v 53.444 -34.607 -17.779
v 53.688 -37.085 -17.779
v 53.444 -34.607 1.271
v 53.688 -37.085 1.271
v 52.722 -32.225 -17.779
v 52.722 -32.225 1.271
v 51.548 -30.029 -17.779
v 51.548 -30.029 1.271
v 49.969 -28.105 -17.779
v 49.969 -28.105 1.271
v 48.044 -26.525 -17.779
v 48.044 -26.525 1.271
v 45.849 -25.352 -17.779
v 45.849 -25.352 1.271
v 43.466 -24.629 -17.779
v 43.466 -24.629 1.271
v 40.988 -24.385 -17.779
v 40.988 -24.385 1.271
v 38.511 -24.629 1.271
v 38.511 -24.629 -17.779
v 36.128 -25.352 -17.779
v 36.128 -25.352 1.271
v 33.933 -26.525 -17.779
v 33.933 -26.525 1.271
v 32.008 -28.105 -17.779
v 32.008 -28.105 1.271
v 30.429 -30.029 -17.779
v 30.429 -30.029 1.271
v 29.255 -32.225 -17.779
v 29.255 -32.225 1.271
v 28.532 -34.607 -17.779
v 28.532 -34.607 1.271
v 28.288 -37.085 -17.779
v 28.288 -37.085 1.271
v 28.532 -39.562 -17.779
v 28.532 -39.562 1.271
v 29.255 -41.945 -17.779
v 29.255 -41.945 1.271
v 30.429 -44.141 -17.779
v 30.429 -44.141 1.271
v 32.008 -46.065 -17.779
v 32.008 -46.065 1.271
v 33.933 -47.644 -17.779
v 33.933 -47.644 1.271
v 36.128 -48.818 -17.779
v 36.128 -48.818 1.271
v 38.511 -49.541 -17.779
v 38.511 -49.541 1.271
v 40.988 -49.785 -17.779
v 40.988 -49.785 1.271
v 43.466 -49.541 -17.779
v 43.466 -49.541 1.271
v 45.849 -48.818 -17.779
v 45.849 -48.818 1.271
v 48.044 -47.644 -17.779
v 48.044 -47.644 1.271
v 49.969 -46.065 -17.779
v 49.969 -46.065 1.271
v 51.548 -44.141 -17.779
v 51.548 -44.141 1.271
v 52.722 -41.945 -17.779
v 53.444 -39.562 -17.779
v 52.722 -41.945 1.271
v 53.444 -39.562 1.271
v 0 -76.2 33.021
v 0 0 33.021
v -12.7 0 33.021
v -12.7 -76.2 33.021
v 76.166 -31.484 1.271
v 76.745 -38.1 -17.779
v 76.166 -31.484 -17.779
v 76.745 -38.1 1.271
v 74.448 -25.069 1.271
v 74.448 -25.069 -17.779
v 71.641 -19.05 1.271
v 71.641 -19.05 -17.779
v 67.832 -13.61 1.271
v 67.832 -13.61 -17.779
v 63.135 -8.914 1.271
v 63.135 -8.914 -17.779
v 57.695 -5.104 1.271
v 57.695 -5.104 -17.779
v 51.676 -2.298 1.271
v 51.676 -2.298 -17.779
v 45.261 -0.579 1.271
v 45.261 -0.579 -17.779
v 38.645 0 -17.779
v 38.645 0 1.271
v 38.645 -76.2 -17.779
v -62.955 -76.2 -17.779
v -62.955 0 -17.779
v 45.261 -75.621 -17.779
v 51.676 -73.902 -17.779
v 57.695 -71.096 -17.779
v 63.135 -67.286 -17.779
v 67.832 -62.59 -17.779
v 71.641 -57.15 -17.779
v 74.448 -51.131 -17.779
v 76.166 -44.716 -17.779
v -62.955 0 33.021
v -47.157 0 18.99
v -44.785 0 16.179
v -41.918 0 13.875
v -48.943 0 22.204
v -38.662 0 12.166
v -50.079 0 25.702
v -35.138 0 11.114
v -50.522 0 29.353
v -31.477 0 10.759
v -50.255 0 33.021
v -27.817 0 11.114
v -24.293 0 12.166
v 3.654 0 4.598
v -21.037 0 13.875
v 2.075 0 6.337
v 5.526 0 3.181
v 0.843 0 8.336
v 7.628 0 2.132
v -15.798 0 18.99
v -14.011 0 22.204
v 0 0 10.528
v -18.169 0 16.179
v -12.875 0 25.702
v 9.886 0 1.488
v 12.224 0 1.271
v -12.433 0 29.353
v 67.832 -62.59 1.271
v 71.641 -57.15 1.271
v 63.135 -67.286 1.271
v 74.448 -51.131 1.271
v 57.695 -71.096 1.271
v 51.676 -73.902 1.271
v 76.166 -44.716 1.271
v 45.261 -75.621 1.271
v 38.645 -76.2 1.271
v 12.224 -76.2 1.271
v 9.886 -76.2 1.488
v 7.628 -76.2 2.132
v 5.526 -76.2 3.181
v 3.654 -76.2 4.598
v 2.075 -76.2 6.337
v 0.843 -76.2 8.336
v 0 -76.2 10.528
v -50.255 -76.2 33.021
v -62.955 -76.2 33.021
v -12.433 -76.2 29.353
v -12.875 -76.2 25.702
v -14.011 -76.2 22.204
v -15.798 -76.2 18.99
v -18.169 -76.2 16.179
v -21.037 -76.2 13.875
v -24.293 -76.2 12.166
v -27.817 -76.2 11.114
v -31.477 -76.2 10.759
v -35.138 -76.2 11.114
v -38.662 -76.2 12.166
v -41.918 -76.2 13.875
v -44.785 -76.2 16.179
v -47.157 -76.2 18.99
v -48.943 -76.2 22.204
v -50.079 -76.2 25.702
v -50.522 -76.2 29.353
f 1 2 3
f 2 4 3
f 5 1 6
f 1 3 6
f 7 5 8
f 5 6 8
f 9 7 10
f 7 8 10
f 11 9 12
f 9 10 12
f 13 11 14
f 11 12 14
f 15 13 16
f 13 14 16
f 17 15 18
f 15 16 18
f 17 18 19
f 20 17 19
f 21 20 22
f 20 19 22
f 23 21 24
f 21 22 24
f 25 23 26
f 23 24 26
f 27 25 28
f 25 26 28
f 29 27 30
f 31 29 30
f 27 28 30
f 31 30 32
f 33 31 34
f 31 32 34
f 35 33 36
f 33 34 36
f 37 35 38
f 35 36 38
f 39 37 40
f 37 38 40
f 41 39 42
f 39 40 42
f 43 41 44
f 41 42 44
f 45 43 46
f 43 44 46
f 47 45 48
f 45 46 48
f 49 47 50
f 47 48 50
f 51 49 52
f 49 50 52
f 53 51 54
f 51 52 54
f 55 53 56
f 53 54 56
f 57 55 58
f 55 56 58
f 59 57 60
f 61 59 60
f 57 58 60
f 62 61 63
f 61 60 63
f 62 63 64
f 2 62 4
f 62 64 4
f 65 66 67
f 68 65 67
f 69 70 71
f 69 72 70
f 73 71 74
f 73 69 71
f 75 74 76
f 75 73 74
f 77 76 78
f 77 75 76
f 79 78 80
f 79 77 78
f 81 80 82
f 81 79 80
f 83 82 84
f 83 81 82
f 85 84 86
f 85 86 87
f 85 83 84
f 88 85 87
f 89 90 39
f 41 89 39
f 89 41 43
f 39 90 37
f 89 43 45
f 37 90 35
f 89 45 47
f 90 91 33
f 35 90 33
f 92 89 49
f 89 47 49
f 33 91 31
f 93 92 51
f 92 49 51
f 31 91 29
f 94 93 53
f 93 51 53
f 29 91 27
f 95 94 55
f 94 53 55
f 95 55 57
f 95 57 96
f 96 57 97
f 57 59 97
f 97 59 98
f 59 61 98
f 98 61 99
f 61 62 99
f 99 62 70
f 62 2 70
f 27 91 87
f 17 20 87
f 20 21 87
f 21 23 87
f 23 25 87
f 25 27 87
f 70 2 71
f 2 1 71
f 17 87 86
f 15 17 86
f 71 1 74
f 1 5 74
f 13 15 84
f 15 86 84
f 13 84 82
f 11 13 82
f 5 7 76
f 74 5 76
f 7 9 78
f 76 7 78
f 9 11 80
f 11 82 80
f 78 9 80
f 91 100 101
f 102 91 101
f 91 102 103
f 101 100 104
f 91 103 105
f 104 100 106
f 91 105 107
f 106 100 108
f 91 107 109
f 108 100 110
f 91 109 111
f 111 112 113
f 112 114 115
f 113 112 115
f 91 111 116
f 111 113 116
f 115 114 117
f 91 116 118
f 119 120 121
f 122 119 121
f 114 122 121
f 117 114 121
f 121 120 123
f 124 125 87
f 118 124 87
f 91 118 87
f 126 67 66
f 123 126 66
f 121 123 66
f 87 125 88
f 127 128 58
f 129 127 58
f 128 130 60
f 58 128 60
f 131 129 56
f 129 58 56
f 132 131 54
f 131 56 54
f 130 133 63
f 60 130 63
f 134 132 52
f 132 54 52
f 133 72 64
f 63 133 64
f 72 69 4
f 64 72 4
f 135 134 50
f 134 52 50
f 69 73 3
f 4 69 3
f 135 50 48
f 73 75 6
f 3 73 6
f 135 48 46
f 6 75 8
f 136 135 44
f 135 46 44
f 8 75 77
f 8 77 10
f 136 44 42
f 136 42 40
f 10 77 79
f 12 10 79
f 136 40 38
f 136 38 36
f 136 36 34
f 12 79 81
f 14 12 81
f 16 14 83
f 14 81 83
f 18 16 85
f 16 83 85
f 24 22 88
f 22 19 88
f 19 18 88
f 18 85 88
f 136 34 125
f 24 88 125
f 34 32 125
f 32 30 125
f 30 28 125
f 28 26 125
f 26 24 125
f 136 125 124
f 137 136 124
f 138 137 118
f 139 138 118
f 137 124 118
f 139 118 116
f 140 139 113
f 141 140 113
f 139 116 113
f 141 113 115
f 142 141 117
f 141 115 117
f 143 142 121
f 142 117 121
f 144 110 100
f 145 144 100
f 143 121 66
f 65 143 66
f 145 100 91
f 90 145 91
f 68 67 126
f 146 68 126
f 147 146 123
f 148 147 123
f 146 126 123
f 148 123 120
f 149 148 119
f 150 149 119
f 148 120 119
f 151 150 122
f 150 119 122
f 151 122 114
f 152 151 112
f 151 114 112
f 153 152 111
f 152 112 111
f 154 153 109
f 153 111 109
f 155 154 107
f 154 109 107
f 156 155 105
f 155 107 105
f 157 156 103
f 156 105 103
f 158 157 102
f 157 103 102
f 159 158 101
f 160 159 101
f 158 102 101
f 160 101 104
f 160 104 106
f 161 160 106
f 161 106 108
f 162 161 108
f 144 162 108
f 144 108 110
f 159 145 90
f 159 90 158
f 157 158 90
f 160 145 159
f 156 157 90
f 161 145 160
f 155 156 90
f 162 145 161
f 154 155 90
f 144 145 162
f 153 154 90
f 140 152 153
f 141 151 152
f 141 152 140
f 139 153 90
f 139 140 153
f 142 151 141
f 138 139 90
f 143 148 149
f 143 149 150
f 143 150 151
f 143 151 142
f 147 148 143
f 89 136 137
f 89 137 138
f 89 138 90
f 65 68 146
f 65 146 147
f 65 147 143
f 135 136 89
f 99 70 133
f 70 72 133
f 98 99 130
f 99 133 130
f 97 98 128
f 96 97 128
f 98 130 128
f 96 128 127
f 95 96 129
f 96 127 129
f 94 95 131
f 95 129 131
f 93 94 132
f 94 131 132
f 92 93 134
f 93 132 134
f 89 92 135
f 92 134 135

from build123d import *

# Parameters (mm, degrees)
F1_DEPTH = 76.2
F2_R     = 38.09999
F3_R     = 12.7
F4_DEPTH = 50.8
F5_DEPTH = 25.4


# Not quite as in the source:
# - a fillet or chamfer is up to 0.001 mm smaller than in the source, because OpenCascade refuses the exact size


with BuildPart() as f1:
    # F0 (on Front) → F1 (new body)
    with BuildSketch(Plane.XZ):
        with BuildLine():
            Line((-50.2547219646, 33.020831282), (-62.9547219646, 33.020831282))
            Line((-62.9547219646, 33.020831282), (-62.9547219646, -17.779168718))
            Line((-62.9547219646, -17.779168718), (76.7452780354, -17.779168718))
            Line((76.7452780354, -17.779168718), (76.7452780354, 1.270831282))
            Line((76.7452780354, 1.270831282), (12.2243361415, 1.270831282))
            ThreePointArc((12.2243361415, 1.270831282), (4.5574789786, 3.8461435711), (0, 10.5276342357))
            Line((0, 10.5276342357), (0, 33.020831282))
            Line((0, 33.020831282), (-12.7, 33.020831282))
            ThreePointArc((-12.7, 33.020831282), (-31.4773609823, 10.7594118855), (-50.2547219646, 33.020831282))
        make_face()
    extrude(amount=F1_DEPTH)

    # F2 (radius 38.1 in the source; OpenCascade refuses exactly that, so slightly less here)
    f2_edges = [f1.edges().sort_by_distance(p)[0] for p in [
        (76.745278, -76.2, -8.254169),
        (76.745278, 0, -8.254169),
    ]]
    fillet(f2_edges, radius=F2_R)

    # F3 (on Top) → F4 (cut)
    with BuildSketch(Plane.XY):
        with Locations((40.9884415567, -37.0847843587)):
            Circle(F3_R)
    extrude(amount=F4_DEPTH, mode=Mode.SUBTRACT)

    # F5 (cut): a face of the model
    f5_faces = [f1.faces().sort_by_distance(p)[0] for p in [
        (40.9884415567, -37.0847843587, 0),
    ]]
    extrude(f5_faces, amount=-F5_DEPTH, mode=Mode.SUBTRACT)


solid = f1.part
